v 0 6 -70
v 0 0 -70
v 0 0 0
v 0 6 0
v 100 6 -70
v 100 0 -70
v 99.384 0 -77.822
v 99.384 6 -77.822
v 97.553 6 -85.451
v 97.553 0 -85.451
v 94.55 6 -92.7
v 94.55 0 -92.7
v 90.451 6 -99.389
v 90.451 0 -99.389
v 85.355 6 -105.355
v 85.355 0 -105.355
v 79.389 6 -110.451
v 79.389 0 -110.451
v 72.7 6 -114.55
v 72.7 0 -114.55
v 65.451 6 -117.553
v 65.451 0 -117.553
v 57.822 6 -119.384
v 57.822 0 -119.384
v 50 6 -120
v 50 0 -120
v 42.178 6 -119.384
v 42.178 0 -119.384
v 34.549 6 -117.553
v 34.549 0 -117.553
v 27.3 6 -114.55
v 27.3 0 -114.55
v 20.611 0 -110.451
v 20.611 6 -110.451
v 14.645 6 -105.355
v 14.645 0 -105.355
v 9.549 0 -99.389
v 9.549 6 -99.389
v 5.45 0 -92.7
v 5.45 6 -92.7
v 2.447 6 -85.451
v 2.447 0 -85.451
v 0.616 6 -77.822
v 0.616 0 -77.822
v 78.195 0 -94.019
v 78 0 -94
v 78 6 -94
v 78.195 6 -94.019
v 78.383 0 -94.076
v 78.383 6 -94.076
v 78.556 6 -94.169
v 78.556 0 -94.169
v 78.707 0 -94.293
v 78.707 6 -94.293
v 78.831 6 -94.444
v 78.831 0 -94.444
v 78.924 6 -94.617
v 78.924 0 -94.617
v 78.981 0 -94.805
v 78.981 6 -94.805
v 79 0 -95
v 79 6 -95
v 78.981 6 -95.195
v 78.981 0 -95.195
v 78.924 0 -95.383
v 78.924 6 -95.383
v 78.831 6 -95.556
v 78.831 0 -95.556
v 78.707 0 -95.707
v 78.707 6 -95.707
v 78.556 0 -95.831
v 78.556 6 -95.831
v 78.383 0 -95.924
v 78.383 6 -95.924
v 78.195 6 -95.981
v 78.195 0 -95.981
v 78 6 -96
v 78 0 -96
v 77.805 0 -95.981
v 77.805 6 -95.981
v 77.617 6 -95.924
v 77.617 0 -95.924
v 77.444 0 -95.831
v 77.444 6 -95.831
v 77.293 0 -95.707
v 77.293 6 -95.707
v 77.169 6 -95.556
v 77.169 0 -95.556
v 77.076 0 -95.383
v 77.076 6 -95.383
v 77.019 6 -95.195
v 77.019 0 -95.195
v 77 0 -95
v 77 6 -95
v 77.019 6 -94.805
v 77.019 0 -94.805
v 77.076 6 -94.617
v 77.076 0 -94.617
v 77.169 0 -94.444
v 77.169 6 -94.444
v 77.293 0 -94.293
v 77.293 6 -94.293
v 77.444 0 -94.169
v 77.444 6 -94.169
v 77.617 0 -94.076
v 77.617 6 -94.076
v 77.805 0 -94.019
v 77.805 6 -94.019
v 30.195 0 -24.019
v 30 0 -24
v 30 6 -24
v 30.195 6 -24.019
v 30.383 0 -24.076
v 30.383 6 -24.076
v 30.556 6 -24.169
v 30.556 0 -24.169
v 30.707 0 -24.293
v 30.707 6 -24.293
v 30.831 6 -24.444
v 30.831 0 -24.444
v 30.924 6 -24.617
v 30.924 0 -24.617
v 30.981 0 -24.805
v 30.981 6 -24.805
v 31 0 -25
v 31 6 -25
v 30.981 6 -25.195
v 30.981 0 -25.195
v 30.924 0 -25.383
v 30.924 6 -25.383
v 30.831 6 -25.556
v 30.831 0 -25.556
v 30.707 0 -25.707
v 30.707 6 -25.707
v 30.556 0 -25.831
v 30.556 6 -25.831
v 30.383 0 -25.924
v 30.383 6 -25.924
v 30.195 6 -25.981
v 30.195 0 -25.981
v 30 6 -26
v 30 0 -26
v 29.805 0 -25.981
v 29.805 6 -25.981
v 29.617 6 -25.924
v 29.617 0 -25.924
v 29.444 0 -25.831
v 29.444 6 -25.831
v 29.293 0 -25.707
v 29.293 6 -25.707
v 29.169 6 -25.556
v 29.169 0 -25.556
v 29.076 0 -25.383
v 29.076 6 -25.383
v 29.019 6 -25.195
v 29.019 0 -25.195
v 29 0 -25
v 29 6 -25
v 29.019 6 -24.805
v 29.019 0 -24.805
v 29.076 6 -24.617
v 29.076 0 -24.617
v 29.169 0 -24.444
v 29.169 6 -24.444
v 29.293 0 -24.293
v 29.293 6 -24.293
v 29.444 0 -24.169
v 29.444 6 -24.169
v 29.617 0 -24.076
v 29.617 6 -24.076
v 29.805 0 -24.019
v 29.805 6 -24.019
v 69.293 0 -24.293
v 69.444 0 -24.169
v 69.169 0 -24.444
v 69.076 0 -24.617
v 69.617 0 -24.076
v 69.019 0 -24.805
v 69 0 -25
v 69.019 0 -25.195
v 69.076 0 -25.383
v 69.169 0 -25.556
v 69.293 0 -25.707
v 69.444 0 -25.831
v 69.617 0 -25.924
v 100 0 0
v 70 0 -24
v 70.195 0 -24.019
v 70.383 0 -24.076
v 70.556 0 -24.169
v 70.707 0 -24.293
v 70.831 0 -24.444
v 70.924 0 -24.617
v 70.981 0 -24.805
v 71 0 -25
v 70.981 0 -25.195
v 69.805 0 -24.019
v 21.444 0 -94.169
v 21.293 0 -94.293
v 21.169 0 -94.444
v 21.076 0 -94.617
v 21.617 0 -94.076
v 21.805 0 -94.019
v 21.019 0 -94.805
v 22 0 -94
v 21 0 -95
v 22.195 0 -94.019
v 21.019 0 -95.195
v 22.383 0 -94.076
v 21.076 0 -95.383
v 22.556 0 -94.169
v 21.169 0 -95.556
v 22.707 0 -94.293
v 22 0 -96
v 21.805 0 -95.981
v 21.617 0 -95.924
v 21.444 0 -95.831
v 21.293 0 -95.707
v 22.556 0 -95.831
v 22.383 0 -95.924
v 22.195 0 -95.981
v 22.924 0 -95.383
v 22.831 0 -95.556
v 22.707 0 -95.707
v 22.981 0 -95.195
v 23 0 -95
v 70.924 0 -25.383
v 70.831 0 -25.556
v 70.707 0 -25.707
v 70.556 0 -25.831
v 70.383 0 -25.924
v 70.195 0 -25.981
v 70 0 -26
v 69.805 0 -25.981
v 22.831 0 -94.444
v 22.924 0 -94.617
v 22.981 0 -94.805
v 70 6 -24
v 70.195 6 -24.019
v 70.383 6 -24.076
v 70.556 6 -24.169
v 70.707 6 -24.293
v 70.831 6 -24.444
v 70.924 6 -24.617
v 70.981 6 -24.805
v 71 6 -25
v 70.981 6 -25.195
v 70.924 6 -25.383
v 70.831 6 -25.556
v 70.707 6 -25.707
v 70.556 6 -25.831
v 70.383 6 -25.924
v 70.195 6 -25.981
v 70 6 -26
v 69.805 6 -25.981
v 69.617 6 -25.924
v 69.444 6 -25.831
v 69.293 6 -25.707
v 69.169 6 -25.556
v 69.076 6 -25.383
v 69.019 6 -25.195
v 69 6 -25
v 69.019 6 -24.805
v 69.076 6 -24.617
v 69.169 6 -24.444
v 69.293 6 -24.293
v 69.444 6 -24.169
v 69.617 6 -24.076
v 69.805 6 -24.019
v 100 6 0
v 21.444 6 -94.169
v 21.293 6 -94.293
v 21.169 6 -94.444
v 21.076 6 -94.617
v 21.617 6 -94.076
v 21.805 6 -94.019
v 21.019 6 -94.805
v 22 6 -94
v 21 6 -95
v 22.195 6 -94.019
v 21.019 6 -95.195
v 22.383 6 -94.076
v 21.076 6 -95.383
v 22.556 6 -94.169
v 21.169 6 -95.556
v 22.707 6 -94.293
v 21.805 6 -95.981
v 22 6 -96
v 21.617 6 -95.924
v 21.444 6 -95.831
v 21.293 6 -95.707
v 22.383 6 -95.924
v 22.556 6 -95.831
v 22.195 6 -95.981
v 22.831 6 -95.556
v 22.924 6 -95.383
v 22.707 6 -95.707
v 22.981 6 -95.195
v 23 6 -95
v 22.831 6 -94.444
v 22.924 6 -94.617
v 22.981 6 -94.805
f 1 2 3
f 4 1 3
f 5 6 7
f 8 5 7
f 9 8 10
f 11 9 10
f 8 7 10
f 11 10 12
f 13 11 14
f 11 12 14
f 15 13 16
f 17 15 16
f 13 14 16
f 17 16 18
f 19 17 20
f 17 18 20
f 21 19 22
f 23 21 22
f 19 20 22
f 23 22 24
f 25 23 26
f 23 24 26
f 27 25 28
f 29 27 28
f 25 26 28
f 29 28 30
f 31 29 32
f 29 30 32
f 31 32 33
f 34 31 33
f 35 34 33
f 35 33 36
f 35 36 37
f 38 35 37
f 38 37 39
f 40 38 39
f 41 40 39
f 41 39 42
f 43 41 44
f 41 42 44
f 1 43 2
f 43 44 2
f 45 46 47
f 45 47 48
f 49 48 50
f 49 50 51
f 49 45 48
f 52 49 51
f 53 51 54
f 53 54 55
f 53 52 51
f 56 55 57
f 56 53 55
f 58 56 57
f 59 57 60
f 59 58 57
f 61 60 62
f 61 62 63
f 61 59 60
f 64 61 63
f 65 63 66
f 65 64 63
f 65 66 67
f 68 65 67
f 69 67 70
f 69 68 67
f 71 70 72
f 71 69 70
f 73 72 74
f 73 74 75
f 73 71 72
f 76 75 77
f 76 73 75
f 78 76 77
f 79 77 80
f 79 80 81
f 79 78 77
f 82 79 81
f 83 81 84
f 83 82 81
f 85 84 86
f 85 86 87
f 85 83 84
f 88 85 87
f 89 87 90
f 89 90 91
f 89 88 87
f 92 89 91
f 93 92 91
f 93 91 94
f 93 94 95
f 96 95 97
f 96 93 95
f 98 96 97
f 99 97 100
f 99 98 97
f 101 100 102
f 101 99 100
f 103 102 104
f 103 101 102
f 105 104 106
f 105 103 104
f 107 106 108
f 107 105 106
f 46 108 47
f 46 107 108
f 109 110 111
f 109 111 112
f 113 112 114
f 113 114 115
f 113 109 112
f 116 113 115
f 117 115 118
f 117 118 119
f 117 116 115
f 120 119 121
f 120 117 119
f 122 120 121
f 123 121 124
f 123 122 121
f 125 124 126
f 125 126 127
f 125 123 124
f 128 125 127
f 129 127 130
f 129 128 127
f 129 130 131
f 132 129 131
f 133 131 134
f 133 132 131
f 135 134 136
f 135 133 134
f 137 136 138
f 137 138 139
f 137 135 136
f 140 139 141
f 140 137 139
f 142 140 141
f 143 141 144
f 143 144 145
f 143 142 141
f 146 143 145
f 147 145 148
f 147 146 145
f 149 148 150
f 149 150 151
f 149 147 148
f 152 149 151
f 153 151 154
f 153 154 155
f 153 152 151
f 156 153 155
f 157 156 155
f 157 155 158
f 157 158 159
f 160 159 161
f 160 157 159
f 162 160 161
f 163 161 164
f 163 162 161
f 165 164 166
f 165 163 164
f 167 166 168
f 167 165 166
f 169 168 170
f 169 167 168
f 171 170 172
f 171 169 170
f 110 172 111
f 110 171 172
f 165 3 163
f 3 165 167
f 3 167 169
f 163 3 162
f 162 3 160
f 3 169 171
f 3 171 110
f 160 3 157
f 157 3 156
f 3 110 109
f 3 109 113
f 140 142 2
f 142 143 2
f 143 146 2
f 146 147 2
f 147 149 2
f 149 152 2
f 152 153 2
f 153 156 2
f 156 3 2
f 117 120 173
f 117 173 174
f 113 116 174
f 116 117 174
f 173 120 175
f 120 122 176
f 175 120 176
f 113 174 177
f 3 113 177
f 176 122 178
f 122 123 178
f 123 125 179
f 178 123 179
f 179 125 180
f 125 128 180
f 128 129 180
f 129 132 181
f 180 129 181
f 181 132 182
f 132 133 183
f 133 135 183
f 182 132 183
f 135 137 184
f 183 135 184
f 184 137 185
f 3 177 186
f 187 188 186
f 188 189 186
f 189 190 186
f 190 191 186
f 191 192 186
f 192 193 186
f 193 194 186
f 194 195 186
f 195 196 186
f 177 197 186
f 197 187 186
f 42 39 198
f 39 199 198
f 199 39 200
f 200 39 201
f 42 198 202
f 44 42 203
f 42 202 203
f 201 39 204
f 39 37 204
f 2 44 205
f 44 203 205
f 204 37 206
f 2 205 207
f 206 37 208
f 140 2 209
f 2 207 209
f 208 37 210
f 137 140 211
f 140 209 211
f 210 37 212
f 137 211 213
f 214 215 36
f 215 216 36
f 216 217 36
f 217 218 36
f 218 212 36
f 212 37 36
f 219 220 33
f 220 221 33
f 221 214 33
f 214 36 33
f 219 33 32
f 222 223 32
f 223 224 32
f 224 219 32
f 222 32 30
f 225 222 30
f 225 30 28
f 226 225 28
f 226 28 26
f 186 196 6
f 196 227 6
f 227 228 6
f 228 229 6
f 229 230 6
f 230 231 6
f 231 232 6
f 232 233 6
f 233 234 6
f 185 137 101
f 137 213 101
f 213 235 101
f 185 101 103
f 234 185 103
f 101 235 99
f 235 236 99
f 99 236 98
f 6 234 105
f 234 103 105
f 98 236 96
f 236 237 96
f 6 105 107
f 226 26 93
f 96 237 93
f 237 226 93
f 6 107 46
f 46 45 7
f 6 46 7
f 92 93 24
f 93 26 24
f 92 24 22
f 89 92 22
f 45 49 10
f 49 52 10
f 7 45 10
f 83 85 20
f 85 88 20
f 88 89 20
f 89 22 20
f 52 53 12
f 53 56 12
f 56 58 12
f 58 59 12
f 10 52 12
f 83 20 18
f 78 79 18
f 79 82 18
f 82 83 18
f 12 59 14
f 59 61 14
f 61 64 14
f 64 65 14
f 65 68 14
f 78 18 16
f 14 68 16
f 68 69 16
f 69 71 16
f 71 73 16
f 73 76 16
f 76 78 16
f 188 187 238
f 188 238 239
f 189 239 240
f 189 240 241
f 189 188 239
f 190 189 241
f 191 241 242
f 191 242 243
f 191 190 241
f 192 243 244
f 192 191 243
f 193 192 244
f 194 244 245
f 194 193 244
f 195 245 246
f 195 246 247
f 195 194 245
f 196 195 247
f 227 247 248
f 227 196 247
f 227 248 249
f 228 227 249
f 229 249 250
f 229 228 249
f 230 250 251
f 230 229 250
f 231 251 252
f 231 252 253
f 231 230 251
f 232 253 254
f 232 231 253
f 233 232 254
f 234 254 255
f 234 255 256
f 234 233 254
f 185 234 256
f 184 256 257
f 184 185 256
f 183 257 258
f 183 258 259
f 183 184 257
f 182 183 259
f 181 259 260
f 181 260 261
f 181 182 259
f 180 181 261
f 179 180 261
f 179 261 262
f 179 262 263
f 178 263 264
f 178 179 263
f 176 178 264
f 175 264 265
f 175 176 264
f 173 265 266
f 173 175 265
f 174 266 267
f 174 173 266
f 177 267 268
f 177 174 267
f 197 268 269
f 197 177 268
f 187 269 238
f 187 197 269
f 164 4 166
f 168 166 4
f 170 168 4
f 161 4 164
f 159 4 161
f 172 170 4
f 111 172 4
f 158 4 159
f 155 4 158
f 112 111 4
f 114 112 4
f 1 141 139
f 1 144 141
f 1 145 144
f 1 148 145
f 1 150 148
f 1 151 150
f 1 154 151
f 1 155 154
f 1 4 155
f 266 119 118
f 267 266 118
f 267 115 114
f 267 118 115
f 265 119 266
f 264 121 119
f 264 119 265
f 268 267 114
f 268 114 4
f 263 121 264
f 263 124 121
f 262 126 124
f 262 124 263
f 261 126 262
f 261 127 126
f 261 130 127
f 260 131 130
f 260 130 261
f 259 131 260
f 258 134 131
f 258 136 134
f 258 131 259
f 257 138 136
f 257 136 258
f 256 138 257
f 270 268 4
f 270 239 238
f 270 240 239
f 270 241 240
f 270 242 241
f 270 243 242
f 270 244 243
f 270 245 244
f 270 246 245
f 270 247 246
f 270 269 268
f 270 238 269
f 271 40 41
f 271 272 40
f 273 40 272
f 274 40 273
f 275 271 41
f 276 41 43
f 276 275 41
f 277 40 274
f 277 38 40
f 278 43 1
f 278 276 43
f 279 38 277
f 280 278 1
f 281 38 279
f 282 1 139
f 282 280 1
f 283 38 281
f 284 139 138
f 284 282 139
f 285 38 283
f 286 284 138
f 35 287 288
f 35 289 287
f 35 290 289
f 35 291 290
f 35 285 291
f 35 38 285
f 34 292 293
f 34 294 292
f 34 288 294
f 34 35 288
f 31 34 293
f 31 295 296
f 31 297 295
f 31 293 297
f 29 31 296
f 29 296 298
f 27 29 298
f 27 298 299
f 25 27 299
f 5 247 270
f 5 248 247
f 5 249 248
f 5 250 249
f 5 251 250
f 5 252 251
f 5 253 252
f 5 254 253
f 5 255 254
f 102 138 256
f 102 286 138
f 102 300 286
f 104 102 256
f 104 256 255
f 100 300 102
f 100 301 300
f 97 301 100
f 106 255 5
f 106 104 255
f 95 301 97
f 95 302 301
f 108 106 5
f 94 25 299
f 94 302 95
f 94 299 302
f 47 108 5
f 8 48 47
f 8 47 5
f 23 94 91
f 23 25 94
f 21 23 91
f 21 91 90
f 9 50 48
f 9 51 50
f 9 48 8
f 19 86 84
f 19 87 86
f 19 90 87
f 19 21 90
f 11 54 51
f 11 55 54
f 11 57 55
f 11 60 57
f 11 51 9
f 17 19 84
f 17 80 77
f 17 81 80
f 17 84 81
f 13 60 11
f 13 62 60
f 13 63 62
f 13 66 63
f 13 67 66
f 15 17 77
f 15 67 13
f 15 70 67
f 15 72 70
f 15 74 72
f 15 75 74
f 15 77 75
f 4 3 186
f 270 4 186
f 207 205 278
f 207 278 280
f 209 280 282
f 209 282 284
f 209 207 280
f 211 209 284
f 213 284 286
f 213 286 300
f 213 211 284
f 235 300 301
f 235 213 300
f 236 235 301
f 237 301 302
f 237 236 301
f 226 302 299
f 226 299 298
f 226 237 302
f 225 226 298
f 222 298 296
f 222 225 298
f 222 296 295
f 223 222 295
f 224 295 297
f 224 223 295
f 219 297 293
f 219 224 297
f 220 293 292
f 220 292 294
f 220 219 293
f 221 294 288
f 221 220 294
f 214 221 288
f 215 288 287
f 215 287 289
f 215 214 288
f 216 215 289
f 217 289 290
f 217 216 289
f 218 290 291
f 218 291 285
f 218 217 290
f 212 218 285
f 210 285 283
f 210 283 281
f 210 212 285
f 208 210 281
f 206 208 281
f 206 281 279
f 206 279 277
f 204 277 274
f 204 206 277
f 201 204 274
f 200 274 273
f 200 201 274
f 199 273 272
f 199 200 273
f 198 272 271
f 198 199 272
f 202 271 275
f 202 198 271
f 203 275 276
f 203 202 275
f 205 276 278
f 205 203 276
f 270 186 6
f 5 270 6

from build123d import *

# Parameters (mm, degrees)
SKETCH1_R           = 1
BOSS_EXTRUDE1_DEPTH = 6


with BuildPart() as part:
    # Sketch1 → Boss-Extrude1 (new body)
    with BuildSketch(Plane(origin=(0, 0, 0), x_dir=(1, 0, 0), z_dir=(0, 1, 0))):
        with BuildLine():
            Line((0, 0), (100, 0))
            Line((100, 0), (100, 70))
            ThreePointArc((100, 70), (50, 120), (0, 70))
            Line((0, 70), (0, 0))
        make_face()
        with Locations(Location((22, 95, 0), (0, 0, 270))):
            Circle(SKETCH1_R, mode=Mode.SUBTRACT)
        with Locations(Location((78, 95, 0), (0, 0, 270))):
            Circle(SKETCH1_R, mode=Mode.SUBTRACT)
        with Locations(Location((30, 25, 0), (0, 0, 270))):
            Circle(SKETCH1_R, mode=Mode.SUBTRACT)
        with Locations(Location((70, 25, 0), (0, 0, 270))):
            Circle(SKETCH1_R, mode=Mode.SUBTRACT)
    extrude(amount=BOSS_EXTRUDE1_DEPTH)


solid = part.part
